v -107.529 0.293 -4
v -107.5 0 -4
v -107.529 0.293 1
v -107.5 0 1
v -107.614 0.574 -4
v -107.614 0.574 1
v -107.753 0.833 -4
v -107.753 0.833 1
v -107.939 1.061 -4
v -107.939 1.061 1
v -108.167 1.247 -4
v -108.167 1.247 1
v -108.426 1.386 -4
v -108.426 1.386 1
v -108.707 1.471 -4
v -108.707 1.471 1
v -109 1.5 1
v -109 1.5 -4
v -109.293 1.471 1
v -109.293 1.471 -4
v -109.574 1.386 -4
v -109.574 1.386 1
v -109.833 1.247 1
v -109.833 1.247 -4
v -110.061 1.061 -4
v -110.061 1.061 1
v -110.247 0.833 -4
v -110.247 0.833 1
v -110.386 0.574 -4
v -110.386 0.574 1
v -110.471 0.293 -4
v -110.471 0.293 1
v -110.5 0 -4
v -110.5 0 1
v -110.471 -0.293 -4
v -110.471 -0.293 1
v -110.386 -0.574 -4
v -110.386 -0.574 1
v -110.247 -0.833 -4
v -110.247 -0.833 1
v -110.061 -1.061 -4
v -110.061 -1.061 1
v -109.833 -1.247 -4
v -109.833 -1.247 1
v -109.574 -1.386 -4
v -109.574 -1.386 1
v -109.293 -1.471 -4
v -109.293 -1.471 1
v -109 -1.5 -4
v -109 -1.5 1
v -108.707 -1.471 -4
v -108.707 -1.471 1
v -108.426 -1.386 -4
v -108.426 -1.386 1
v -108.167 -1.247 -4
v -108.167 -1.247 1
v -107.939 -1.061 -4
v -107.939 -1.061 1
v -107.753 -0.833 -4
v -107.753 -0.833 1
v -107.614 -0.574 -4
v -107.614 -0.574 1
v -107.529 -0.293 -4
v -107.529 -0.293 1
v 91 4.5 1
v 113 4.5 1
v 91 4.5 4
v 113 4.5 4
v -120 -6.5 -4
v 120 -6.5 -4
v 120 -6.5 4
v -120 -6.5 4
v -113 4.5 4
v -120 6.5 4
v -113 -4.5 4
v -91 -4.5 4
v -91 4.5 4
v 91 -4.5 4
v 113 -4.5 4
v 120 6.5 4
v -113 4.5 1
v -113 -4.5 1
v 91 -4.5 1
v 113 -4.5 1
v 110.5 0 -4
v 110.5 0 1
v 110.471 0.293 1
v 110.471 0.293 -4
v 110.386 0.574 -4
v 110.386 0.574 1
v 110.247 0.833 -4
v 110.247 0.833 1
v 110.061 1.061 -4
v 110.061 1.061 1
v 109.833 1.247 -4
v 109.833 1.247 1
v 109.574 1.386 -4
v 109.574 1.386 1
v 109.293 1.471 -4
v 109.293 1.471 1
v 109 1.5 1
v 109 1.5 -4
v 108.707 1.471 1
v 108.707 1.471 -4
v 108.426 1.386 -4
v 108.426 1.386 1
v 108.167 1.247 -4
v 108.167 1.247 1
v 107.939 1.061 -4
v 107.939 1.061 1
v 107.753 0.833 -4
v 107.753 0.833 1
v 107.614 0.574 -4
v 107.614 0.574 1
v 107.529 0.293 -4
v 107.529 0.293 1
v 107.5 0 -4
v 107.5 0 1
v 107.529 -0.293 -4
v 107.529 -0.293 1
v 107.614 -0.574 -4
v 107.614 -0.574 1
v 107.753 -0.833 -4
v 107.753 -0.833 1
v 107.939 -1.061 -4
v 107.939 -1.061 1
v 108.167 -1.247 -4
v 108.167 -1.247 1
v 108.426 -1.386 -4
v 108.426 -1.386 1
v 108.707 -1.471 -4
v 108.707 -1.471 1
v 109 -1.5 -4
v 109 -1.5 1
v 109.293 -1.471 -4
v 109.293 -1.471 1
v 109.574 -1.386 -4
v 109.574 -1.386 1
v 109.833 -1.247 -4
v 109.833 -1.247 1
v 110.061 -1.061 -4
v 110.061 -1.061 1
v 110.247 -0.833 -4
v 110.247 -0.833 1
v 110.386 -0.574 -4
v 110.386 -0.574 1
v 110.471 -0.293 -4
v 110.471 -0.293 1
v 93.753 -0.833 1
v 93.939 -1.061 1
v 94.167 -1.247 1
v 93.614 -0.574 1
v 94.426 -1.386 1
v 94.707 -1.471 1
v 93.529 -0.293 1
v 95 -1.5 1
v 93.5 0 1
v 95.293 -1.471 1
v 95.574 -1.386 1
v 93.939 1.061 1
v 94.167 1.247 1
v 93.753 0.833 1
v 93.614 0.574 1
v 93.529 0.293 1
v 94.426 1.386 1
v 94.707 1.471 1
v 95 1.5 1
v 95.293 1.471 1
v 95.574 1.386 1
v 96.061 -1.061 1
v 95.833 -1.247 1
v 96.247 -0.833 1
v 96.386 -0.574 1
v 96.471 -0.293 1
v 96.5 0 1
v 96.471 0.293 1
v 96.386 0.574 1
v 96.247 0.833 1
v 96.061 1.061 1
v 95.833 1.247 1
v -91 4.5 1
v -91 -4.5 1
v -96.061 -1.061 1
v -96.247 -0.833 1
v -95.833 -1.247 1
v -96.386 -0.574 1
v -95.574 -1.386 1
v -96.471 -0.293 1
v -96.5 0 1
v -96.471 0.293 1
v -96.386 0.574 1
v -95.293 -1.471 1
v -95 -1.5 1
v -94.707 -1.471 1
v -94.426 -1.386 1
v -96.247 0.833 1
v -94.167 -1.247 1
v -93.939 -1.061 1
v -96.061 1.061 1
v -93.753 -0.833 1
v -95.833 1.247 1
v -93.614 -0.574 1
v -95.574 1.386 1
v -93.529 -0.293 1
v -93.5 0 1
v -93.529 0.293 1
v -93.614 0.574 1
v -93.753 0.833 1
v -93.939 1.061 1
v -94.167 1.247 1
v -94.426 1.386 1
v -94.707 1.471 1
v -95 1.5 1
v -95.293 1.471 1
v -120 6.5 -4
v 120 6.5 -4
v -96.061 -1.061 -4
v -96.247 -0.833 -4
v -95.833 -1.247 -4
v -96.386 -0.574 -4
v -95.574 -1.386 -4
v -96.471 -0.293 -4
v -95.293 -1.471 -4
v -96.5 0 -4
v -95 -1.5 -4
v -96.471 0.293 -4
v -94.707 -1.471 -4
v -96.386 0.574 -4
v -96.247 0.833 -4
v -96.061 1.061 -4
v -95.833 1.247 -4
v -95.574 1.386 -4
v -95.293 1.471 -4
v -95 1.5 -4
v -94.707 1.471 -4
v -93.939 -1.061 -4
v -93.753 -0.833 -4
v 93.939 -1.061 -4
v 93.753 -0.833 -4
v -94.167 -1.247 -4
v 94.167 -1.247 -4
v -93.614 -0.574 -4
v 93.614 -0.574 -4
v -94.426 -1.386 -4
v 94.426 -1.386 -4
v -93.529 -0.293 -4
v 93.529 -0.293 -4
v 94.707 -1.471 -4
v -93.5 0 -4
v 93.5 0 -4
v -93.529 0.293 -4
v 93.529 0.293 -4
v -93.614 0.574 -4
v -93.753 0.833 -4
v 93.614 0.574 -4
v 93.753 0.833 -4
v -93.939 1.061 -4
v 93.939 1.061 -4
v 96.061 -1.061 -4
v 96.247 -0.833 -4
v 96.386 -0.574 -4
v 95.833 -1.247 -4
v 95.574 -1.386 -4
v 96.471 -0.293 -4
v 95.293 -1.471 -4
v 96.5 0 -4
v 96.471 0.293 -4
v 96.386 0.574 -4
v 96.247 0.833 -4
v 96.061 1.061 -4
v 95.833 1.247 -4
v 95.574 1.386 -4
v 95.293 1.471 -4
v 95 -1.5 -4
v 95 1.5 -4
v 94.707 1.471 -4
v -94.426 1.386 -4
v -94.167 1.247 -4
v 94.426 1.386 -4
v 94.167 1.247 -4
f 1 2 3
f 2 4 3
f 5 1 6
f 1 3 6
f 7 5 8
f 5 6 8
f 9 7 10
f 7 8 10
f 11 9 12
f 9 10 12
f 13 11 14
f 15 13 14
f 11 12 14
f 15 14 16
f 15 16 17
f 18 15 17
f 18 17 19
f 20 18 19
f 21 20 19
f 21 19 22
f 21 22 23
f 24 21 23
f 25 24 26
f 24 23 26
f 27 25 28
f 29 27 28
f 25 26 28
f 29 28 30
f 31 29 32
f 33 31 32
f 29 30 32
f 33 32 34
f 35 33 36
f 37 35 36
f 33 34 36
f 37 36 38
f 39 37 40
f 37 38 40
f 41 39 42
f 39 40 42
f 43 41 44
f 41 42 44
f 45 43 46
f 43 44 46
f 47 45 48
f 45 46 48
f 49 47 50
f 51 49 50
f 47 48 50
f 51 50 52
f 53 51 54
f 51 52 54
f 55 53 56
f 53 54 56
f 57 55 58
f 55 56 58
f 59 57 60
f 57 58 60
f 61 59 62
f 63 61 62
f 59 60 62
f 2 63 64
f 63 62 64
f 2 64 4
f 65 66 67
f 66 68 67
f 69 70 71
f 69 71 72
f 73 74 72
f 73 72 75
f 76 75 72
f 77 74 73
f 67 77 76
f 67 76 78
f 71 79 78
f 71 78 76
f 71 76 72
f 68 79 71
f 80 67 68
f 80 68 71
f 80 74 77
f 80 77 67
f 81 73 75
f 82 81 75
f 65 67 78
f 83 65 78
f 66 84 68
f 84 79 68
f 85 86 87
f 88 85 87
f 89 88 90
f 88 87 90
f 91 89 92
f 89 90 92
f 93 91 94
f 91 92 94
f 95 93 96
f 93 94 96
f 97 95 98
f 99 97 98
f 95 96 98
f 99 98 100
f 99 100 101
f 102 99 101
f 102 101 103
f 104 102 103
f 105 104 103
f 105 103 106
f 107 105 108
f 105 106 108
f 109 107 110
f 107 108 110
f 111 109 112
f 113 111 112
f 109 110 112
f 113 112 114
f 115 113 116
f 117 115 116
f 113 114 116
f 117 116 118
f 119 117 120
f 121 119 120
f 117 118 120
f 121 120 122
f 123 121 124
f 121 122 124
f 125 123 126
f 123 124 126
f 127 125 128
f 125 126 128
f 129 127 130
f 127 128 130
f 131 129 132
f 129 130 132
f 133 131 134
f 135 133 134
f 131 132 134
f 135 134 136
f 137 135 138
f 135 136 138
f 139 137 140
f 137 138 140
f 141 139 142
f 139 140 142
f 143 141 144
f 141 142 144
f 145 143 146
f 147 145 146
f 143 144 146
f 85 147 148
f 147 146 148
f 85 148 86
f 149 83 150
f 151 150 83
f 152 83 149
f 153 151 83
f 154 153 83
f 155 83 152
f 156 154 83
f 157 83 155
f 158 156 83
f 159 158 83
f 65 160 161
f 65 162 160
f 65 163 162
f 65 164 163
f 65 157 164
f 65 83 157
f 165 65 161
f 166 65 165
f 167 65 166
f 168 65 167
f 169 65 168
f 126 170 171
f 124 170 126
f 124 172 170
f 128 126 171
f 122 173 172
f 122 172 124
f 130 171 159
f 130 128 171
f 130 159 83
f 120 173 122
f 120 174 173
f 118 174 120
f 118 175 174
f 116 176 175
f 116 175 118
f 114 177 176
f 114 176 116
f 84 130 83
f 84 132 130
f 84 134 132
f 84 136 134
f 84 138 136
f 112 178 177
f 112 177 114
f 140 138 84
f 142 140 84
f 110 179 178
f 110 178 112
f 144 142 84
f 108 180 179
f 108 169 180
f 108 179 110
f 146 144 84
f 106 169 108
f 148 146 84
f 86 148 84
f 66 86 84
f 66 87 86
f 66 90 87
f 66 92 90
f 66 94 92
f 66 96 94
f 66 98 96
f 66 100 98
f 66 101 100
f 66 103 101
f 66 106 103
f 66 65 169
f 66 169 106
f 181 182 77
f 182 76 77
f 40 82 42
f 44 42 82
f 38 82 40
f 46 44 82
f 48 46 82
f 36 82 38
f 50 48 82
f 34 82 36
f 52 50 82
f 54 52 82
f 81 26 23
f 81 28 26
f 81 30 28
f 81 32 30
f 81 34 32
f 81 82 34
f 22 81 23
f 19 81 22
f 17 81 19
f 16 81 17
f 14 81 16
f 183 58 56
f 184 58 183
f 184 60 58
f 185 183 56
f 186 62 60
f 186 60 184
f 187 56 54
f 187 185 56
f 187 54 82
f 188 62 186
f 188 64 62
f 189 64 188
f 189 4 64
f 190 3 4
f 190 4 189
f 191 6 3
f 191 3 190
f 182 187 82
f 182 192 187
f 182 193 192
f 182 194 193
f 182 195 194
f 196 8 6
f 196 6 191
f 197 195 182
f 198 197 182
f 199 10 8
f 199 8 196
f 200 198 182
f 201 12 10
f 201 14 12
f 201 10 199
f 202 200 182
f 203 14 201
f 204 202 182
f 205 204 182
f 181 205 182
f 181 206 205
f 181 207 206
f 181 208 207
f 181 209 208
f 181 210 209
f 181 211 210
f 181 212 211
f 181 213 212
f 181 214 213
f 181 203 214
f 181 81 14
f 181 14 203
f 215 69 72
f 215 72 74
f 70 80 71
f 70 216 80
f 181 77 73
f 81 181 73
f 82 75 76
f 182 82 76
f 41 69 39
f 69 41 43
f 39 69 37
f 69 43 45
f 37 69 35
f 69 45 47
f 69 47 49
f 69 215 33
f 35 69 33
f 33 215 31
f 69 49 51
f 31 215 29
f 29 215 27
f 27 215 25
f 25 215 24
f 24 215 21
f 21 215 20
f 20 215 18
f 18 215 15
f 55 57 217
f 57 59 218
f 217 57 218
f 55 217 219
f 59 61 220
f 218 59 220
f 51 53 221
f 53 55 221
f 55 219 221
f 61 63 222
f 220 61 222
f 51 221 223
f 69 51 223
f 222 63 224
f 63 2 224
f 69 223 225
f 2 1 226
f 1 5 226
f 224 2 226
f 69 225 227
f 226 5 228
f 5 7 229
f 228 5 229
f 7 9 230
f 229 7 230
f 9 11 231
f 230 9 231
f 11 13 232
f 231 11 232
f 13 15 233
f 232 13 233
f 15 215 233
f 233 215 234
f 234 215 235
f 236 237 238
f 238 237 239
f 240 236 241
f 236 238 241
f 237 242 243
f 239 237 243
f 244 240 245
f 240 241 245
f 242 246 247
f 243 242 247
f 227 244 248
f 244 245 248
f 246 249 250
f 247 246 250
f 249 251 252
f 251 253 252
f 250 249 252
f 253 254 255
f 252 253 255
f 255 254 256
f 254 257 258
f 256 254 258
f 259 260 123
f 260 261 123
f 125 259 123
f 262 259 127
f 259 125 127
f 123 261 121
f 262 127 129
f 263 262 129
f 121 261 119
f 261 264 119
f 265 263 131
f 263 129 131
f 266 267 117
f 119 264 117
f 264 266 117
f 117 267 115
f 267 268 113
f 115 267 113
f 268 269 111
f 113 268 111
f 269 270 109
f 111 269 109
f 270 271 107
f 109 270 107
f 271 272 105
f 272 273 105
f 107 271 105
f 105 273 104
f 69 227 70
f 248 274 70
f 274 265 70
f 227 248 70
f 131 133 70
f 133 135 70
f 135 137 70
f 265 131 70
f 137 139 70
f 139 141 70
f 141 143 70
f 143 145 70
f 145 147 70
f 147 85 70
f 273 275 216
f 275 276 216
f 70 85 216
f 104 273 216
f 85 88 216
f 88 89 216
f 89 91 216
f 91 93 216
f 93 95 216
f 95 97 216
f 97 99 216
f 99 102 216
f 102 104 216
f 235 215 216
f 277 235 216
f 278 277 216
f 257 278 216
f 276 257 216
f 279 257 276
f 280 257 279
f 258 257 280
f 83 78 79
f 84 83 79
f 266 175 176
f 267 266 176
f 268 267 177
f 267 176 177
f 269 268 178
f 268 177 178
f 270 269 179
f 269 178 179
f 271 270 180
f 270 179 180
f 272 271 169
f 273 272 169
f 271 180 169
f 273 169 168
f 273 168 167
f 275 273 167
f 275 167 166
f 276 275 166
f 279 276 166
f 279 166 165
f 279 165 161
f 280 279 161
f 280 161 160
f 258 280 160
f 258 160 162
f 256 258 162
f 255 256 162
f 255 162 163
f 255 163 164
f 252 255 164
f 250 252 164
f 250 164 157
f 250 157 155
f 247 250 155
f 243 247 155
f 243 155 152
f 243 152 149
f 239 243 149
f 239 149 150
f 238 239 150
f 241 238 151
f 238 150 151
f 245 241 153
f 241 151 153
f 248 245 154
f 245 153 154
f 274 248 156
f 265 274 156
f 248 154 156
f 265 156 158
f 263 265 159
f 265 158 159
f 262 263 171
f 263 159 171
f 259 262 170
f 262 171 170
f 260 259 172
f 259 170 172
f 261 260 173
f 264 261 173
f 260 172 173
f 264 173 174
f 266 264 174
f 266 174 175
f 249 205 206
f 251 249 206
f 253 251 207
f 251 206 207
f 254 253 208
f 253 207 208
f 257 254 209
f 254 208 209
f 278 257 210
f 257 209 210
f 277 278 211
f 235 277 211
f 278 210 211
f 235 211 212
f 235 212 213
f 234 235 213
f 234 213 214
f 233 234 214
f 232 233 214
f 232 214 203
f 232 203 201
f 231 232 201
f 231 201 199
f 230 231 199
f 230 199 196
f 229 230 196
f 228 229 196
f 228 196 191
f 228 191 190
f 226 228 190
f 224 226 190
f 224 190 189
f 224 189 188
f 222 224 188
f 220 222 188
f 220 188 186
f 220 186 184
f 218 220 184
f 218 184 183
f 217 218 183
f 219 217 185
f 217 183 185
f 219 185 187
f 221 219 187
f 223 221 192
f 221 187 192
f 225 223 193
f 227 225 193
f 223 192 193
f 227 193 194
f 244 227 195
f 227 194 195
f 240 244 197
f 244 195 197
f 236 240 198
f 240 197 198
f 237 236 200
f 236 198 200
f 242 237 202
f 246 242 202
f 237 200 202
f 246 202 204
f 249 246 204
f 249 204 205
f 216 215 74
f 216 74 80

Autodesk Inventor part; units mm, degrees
sketch "Sketch1" plane through (0, 0, 0) normal (0, 0, 1) x (1, 0, 0)
  line L0 (-120, 6.5) -> (120, 6.5)
  line L1 (120, 6.5) -> (120, -6.5)
  line L2 (120, -6.5) -> (-120, -6.5)
  line L3 (-120, -6.5) -> (-120, 6.5)
  line L4 (-120, 6.5) -> (120, -6.5) construction
  line L5 (120, 6.5) -> (-120, -6.5) construction
  point P0 (0, 0)
  point P1 (0, 0)
  dimension "d0" = 240
  dimension "d1" = 13
extrude "Extrusion1" add sketch "Sketch1" along normal mid plane 8
sketch "Sketch2" plane through (0, 0, 4) normal (0, 0, 1) x (1, 0, 0)
  circle A0 centre (-109, 0) radius 1.5 projected
  circle A1 centre (-95, 0) radius 1.5 projected
  circle A2 centre (95, 0) radius 1.5 projected
  circle A3 centre (109, 0) radius 1.5 projected
  point P0 (0, 0)
extrude "Extrusion2" cut sketch "Sketch2" against normal through all
sketch "Sketch3" plane through (0, 0, 4) normal (0, 0, 1) x (1, 0, 0)
  line L0 (-95, 0) -> (-109, 0) construction
  circle A0 centre (-95, 0) radius 1.5 projected
  circle A1 centre (-109, 0) radius 1.5 projected
  line L1 (-91, 4.5) -> (-113, 4.5)
  line L2 (-113, 4.5) -> (-113, -4.5)
  line L3 (-113, -4.5) -> (-91, -4.5)
  line L4 (-91, -4.5) -> (-91, 4.5)
  line L5 (-91, 4.5) -> (-113, -4.5) construction
  line L6 (-113, 4.5) -> (-91, -4.5) construction
  circle A2 centre (109, 0) radius 1.5 projected
  circle A3 centre (95, 0) radius 1.5 projected
  line L7 (109, 0) -> (95, 0) construction
  line L8 (113, 4.5) -> (91, 4.5)
  line L9 (91, 4.5) -> (91, -4.5)
  line L10 (91, -4.5) -> (113, -4.5)
  line L11 (113, -4.5) -> (113, 4.5)
  line L12 (113, 4.5) -> (91, -4.5) construction
  line L13 (91, 4.5) -> (113, -4.5) construction
  point P0 (0, 0)
  point P1 (-102, 0)
  point P2 (-102, 0)
  point P3 (102, 0)
  point P4 (102, 0)
  dimension "d9" = 22
  dimension "d10" = 9
extrude "Extrusion3" cut sketch "Sketch3" against normal blind 3
properties part number "conector_eixos_001" material "ABS Plastic"
